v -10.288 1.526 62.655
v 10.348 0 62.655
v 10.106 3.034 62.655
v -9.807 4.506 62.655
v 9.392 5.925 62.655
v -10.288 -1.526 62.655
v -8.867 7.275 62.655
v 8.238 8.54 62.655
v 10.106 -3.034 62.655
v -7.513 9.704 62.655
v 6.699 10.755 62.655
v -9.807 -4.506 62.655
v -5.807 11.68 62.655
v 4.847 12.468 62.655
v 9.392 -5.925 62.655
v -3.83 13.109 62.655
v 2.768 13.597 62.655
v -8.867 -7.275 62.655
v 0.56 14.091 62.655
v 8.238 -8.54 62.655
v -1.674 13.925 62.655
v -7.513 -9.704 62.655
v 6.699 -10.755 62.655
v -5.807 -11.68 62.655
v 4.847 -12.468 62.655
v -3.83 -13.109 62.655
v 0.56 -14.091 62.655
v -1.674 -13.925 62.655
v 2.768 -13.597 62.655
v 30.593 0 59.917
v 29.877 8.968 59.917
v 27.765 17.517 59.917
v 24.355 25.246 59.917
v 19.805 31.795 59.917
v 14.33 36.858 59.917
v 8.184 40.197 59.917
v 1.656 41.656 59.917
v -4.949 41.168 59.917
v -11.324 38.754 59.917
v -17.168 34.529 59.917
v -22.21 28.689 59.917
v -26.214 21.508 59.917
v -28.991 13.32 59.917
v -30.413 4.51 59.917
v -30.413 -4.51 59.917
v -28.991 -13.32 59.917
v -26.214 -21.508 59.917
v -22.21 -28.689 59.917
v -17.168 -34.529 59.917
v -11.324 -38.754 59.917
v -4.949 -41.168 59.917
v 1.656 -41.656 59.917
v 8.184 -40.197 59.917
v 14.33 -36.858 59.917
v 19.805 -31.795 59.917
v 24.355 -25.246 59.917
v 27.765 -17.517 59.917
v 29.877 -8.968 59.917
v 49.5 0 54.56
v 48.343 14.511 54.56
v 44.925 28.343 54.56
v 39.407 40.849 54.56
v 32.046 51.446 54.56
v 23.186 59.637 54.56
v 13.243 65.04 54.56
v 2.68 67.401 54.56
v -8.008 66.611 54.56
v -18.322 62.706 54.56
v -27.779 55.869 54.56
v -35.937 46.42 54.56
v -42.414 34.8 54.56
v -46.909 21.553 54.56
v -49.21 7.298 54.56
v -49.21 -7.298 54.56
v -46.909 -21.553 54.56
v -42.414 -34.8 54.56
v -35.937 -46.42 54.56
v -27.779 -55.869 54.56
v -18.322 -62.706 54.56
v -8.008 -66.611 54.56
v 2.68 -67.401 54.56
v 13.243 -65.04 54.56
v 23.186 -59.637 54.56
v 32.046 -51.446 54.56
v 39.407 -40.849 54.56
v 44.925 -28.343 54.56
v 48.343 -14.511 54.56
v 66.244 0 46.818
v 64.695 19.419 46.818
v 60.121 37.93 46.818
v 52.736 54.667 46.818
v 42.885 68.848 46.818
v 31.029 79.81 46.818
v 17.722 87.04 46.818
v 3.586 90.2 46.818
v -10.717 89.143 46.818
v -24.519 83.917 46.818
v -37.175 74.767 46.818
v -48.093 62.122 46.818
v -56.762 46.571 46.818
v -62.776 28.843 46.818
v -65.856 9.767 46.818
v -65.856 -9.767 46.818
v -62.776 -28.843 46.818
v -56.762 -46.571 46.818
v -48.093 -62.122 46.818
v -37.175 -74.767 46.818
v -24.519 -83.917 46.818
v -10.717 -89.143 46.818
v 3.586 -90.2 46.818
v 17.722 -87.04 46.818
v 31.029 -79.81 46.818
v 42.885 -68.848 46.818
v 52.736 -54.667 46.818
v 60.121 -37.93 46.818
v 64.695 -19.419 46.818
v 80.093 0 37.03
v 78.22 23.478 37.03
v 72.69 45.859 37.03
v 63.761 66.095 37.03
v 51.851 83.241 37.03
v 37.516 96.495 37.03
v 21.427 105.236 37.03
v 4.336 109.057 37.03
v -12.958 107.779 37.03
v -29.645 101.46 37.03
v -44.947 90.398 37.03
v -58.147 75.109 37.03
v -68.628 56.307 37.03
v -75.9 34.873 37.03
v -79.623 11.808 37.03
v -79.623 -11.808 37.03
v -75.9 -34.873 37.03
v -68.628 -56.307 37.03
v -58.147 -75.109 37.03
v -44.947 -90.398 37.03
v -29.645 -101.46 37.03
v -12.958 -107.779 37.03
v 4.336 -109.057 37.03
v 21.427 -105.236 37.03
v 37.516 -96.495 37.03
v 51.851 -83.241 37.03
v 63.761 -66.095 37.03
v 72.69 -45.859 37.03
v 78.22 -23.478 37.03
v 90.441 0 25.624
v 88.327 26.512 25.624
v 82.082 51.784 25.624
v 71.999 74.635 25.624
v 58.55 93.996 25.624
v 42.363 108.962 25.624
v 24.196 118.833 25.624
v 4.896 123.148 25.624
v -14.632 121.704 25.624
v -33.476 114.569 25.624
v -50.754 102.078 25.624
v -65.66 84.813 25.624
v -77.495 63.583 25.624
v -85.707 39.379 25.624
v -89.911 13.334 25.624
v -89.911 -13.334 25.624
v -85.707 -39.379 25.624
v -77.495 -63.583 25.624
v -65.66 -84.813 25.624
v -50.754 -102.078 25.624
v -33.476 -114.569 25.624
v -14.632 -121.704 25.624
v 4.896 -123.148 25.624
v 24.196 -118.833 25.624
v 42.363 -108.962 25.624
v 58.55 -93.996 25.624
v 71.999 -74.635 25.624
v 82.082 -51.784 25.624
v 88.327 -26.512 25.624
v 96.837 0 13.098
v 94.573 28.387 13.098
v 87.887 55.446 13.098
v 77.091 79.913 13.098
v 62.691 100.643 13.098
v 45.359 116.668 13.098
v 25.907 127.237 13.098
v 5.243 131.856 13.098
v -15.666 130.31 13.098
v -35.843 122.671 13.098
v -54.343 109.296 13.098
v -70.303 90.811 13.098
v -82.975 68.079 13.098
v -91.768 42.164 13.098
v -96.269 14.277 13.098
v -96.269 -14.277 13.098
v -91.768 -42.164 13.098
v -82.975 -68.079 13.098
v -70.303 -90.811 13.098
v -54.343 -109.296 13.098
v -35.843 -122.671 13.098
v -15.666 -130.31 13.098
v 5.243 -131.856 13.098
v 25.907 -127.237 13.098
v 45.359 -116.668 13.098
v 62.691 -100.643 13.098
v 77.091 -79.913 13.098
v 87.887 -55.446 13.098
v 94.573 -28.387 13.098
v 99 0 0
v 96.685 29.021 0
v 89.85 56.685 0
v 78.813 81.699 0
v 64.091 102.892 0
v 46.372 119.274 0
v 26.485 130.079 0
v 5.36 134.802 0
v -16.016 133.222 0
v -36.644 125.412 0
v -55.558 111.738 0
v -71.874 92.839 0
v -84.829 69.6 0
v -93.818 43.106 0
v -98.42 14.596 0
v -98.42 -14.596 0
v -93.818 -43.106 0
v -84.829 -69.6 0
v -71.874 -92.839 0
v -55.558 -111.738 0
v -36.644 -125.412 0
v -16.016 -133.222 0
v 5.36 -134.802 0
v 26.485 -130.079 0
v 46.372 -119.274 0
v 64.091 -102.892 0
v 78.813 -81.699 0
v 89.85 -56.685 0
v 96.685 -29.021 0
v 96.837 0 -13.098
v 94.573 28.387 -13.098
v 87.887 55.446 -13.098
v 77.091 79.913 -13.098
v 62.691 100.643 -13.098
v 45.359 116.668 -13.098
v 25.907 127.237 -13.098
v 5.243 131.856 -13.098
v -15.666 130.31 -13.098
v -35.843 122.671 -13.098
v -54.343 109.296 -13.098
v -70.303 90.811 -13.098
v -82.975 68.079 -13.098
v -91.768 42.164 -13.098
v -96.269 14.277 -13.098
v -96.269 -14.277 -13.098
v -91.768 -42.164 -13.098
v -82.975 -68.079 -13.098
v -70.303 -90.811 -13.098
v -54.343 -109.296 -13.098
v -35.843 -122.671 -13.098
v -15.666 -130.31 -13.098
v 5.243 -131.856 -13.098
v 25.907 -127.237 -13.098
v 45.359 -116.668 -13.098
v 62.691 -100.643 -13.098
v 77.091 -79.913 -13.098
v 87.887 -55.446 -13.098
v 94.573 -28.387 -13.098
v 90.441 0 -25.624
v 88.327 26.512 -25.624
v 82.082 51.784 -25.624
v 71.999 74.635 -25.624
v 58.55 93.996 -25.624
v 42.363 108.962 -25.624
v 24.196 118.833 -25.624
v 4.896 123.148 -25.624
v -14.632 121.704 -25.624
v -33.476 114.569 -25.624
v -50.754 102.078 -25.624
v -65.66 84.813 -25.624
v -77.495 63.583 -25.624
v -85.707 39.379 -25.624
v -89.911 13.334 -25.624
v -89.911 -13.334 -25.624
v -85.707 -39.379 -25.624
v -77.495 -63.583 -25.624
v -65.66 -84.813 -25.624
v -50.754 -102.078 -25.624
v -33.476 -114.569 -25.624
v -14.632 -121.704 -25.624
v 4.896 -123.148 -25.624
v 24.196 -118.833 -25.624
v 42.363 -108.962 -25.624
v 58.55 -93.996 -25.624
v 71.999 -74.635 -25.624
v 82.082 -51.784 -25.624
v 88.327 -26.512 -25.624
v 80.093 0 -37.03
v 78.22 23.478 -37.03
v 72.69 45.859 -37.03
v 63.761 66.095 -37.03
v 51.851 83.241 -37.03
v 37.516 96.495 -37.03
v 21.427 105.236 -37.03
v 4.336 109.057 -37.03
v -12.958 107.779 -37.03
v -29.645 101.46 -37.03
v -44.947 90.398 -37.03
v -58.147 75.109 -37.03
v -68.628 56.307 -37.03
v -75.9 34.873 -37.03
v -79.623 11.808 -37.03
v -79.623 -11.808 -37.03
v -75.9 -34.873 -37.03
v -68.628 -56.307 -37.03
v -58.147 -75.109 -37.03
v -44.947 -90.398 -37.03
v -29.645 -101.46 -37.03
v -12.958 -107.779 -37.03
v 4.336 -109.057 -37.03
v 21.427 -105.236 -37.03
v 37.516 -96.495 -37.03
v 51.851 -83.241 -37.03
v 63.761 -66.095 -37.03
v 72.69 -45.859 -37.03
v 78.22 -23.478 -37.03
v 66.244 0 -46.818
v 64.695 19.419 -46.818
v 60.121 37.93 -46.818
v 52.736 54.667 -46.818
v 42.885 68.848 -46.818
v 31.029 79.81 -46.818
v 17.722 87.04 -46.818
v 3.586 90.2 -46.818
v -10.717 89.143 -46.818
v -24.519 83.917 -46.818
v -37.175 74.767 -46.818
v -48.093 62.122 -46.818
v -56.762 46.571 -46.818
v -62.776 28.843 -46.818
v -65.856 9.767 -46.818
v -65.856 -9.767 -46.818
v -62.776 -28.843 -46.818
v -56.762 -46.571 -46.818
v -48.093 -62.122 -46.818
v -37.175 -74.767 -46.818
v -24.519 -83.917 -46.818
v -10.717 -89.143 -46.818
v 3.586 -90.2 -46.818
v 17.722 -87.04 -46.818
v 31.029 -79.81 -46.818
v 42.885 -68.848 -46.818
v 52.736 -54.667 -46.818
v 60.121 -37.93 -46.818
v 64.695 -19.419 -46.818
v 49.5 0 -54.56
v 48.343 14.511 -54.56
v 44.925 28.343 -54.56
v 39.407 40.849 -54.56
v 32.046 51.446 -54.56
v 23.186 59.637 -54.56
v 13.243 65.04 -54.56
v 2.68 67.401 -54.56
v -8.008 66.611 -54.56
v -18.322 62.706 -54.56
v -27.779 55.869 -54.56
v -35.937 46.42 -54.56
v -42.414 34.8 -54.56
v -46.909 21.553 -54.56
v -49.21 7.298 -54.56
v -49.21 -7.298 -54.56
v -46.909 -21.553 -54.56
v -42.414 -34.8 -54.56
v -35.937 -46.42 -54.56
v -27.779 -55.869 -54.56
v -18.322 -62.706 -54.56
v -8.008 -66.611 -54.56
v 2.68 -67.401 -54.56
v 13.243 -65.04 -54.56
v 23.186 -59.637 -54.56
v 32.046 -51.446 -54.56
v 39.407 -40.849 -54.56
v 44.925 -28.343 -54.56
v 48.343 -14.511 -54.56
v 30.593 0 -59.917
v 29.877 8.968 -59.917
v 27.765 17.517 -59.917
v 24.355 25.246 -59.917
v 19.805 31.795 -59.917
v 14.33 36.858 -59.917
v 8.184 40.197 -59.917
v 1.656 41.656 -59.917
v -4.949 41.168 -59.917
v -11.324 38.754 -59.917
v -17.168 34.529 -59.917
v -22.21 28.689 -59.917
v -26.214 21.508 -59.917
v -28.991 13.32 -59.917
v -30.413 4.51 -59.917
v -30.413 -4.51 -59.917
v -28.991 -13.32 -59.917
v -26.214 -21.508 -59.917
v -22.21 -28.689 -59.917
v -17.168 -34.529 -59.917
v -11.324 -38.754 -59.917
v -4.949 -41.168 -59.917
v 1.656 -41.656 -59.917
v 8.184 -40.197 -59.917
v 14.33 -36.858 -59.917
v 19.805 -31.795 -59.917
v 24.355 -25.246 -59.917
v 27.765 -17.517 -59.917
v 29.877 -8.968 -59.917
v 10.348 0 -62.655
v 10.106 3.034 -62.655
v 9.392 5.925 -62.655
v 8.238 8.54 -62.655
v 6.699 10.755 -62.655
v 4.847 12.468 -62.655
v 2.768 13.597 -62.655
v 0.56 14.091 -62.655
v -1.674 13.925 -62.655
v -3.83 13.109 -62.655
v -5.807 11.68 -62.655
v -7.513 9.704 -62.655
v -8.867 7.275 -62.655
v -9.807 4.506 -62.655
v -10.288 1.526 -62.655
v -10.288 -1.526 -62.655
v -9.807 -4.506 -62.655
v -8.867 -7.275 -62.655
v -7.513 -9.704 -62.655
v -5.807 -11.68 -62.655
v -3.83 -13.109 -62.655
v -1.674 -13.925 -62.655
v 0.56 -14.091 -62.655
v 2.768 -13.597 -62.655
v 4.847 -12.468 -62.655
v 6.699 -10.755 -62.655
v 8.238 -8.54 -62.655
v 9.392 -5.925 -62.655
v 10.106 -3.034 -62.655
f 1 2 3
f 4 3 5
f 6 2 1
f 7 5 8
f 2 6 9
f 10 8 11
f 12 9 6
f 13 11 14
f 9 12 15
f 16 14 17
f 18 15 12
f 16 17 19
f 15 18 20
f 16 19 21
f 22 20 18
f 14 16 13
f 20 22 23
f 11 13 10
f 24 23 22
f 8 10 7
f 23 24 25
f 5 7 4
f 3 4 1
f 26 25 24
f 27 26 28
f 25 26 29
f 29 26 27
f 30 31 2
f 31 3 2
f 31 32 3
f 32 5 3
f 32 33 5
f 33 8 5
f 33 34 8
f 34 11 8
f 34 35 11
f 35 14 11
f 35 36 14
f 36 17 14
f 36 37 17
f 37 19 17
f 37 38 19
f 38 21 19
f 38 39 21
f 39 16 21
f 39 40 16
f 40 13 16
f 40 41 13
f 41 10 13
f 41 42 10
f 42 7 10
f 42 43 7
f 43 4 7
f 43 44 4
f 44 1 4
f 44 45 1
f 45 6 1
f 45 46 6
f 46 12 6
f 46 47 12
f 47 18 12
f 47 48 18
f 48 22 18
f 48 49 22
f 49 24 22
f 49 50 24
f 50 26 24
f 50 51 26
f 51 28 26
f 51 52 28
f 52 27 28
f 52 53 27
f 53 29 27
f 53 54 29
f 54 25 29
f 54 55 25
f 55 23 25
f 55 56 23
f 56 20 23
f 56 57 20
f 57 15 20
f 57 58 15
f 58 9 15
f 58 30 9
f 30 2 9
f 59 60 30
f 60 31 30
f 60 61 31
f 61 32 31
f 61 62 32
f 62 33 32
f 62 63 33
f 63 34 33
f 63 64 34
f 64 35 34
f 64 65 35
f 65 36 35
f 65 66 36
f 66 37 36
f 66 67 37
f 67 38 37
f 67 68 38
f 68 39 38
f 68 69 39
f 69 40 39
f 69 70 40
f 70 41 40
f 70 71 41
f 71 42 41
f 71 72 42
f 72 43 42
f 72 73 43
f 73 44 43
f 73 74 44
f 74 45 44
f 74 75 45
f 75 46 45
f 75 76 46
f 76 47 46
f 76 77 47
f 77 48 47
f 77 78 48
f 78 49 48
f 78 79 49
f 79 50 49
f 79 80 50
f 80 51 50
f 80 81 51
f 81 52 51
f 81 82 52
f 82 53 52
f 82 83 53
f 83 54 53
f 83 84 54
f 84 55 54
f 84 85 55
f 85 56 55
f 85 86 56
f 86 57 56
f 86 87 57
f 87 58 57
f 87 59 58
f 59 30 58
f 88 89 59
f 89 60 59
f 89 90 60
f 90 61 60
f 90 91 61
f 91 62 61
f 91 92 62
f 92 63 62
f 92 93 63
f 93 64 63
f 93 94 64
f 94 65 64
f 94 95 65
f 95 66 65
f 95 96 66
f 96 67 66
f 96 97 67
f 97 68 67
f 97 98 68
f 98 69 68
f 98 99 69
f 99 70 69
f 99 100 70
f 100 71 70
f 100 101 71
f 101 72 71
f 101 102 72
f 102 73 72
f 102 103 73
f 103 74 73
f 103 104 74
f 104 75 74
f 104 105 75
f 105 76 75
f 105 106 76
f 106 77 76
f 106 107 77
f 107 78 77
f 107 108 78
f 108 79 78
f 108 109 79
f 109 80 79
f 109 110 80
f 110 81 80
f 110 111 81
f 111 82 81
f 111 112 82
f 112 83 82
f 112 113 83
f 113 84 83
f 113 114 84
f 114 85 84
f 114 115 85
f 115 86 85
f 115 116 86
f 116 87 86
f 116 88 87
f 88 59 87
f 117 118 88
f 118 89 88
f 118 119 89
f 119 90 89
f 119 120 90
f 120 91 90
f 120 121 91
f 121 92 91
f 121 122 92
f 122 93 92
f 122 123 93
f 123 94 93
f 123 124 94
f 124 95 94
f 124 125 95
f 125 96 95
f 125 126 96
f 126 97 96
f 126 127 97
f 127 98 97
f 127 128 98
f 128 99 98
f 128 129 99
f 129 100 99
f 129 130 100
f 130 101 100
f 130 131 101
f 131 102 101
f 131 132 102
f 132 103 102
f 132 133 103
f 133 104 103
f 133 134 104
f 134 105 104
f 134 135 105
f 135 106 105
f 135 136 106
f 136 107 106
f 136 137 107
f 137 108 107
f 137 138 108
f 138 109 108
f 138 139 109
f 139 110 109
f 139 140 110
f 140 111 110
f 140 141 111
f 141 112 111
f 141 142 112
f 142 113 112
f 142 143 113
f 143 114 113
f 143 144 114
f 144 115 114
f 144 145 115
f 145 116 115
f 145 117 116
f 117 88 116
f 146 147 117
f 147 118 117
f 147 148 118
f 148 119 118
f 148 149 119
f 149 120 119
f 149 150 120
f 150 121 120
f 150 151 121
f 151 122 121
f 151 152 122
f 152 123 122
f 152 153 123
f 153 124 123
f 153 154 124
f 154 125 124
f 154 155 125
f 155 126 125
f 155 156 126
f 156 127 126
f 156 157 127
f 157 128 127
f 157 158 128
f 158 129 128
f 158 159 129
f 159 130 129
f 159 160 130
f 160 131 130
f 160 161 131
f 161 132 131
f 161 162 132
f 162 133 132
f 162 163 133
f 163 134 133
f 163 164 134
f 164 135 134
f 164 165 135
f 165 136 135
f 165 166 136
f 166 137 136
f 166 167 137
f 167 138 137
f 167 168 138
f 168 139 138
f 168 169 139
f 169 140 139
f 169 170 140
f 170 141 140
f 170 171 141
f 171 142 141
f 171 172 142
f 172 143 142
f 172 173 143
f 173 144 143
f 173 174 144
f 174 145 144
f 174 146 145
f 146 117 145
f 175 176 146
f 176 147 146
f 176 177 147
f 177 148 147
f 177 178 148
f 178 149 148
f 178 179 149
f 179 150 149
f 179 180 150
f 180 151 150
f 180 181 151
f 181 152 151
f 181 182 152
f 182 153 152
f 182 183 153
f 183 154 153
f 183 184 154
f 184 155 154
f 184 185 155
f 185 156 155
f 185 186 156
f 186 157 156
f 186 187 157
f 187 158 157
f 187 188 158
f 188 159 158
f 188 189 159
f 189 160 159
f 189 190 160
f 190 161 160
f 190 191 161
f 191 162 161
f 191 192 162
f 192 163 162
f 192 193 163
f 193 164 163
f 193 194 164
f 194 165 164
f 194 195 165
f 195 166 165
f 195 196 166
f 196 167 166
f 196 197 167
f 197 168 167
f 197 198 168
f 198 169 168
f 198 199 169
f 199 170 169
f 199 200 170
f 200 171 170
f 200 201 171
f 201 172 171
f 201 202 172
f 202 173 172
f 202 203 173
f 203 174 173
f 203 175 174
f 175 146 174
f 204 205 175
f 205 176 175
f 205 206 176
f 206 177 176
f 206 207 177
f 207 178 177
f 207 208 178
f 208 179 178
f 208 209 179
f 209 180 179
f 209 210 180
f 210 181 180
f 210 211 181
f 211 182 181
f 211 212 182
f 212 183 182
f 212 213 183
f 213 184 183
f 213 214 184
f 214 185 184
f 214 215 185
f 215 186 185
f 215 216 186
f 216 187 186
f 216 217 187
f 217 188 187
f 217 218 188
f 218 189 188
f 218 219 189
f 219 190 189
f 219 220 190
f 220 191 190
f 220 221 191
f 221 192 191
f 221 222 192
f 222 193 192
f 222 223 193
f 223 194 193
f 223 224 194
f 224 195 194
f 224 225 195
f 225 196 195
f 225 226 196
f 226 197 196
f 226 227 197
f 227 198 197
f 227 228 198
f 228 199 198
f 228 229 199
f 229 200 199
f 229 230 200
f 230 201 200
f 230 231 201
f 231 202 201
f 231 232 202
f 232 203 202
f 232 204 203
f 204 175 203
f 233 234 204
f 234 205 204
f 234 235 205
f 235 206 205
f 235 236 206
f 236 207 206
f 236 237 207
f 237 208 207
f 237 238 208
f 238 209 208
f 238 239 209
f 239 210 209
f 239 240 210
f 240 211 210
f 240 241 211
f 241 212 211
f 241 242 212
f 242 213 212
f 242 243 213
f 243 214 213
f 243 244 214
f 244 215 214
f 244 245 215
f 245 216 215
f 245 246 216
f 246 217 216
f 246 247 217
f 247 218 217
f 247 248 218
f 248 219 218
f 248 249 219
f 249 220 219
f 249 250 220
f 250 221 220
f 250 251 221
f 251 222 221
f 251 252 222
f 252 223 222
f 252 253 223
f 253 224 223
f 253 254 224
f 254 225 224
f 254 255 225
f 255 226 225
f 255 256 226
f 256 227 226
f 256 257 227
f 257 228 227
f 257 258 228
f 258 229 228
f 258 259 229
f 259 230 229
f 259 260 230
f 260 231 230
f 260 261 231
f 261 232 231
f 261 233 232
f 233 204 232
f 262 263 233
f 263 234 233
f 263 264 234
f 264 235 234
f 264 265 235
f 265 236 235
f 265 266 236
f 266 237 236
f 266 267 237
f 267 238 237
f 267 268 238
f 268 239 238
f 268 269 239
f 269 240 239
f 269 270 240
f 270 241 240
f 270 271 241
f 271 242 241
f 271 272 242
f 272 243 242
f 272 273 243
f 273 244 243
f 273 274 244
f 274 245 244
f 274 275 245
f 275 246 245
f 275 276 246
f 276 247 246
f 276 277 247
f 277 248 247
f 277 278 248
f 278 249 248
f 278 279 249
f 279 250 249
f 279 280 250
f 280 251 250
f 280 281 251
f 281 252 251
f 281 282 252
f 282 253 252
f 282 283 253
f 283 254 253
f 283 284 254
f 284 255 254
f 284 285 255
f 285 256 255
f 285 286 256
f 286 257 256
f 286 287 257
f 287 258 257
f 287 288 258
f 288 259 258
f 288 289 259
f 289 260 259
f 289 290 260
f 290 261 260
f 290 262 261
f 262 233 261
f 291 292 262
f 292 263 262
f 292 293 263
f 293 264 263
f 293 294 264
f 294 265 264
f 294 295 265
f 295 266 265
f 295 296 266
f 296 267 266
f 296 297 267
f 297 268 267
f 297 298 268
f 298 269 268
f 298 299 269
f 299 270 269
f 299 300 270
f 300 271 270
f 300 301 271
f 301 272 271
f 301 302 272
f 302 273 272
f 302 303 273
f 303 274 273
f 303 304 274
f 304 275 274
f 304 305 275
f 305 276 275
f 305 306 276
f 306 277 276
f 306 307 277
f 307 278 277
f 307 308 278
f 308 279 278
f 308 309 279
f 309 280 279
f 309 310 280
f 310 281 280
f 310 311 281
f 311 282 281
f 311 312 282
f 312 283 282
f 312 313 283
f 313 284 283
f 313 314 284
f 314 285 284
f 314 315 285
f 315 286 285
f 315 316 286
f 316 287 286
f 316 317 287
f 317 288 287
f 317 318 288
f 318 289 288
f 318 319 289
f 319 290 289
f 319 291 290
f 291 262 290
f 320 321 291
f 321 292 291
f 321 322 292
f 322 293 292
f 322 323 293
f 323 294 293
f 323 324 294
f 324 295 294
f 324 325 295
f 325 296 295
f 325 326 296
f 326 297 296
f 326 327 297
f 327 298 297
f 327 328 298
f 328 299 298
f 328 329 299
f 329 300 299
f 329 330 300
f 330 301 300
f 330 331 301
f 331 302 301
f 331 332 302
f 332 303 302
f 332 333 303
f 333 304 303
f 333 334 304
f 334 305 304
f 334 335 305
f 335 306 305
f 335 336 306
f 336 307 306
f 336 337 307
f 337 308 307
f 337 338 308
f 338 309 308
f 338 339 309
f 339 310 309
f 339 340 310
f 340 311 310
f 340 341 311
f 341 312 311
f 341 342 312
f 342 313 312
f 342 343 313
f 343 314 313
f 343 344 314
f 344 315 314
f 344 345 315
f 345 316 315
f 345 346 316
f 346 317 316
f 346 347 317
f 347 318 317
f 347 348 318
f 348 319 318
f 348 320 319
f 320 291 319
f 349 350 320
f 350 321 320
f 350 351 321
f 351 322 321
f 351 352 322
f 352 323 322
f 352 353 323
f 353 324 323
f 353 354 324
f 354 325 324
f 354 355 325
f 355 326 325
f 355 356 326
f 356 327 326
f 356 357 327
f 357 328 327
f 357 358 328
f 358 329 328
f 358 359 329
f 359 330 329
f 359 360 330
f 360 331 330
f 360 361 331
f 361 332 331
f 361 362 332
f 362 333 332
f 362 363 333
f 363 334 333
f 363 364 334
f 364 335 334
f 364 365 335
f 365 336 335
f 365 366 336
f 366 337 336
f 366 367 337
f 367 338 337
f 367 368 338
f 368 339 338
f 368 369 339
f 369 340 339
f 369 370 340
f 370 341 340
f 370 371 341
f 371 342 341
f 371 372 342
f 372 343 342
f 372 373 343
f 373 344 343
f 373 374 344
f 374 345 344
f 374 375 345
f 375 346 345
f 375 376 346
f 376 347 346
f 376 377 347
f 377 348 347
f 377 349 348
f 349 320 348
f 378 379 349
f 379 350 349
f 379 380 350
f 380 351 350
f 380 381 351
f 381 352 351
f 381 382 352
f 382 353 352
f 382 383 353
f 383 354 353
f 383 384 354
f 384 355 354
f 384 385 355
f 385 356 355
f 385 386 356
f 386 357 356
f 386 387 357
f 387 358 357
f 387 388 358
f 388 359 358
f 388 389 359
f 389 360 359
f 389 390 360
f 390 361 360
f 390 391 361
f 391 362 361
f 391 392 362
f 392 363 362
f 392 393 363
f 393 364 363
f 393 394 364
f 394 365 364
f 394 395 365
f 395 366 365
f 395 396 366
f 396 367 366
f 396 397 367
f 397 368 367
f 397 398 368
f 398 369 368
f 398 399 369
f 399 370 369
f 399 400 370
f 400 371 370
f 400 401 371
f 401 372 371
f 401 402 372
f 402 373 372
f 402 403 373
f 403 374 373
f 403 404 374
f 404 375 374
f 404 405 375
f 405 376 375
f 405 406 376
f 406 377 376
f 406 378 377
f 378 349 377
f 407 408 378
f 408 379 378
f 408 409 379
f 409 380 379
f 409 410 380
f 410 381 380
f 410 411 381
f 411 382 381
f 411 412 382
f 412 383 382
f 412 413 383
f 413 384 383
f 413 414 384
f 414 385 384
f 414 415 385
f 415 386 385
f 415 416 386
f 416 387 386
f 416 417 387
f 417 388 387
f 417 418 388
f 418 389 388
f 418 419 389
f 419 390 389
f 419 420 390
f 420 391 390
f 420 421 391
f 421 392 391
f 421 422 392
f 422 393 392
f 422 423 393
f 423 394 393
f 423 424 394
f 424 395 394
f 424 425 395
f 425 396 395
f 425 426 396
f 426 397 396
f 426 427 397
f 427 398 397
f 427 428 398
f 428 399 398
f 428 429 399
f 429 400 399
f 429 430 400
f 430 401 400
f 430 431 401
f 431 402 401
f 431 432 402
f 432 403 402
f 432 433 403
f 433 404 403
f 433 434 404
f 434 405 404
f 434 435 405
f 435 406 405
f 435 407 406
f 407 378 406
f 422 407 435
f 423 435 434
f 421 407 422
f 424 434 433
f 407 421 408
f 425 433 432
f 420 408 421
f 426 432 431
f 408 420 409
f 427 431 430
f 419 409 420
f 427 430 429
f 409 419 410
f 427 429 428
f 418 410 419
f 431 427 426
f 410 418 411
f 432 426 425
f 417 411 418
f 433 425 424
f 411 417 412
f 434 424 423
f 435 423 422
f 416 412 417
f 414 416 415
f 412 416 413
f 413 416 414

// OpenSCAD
// Generated by SolidPython 1.0.1 on 2020-07-29 00:46:50


scale(v = [11, 15, 7]) {
	sphere(r = 9);
}
/***********************************************
*********      SolidPython code:      **********
************************************************
 
# import packages: SolidPython
from solid import *
from solid.utils import *
from itertools import chain, combinations, permutations


class Resize:

    def __init__(self, scad_file):
        self.scad_file = scad_file
        #self.scad_file = import_scad(scad_file)
        # cone/cylinder param:
        self.r1 = 0
        self.r2 = 0
        self.h = 0
        # rectangular prism param:
        self.w = 0
        self.l = 0
        # ellipse param:
        self.r = 0

    # import OpenScad code (file name corresponds to shape)


    # classify shape + parameters
    def assign(self, param1, param2, param3):
        if self.scad_file == 'cone.scad':
            self.r1 = param1
            self.r2 = param2
            self.h = param3
        elif self.scad_file == 'cylinder.scad':
            self.r1 = param1
            self.r2 = param2
            self.h = param3
        elif self.scad_file == 'rectangularPrism.scad':
            self.h = param1
            self.l = param2
            self.w = param3
        else:
            self.r = param1
            self.h = param2

    # resize parameters
    def iterate(self):
        x = range(3, 20, 2)
        i = 1
        if self.scad_file == 'cone.scad':
            tempList = list(permutations(x, 2))
            for temp in tempList:
                param1 = temp[0]
                param2 = temp[1]
                filepath = 'produced_scad_files/' + 'cone' + str(param1) + '_' + str(param2) + '_' + '.scad'
                scad_render_to_file(cylinder(h=param1, r1=param2, r2=0), filepath)

        elif self.scad_file == 'cylinder.scad':
            tempList = list(permutations(x, 3))
            for temp in tempList:
                param1 = temp[0]
                param2 = temp[1]
                filepath = 'produced_scad_files/' + 'cylinder' + str(param1) + '_' + str(param2) + '_' + '.scad'
                scad_render_to_file(cylinder(h=param1, r1=param2, r2=param2), filepath)

        elif self.scad_file == 'rectangularPrism.scad':
            tempList = list(permutations(x, 3))
            for temp in tempList:
                param1 = temp[0]
                param2 = temp[1]
                param3 = temp[2]
                filepath = 'produced_scad_files/' + 'rectangularPrism' + str(param1) + '_' + str(param2) + '_' + str(
                    param3) + '.scad'
                scad_render_to_file(cube(size=(param1, param2, param3)), filepath)

        elif self.scad_file == 'ellipse.scad':
            tempList = list(permutations(x, 4))
            for temp in tempList:
                param1 = temp[0]
                param2 = temp[1]
                param3 = temp[2]
                param4 = temp[3]
                filepath = 'produced_scad_files/' + 'ellipse' + str(param1) + '_' + str(param2) + '_' + str(param3) + '_' + str(param4) + '.scad'
                scad_render_to_file(scale([param1, param2, param3])(sphere(r=param4)), filepath)

    def render_to_scadfile(self):
        scad_render_to_file(scad, 'example.scad') 
 
************************************************/
